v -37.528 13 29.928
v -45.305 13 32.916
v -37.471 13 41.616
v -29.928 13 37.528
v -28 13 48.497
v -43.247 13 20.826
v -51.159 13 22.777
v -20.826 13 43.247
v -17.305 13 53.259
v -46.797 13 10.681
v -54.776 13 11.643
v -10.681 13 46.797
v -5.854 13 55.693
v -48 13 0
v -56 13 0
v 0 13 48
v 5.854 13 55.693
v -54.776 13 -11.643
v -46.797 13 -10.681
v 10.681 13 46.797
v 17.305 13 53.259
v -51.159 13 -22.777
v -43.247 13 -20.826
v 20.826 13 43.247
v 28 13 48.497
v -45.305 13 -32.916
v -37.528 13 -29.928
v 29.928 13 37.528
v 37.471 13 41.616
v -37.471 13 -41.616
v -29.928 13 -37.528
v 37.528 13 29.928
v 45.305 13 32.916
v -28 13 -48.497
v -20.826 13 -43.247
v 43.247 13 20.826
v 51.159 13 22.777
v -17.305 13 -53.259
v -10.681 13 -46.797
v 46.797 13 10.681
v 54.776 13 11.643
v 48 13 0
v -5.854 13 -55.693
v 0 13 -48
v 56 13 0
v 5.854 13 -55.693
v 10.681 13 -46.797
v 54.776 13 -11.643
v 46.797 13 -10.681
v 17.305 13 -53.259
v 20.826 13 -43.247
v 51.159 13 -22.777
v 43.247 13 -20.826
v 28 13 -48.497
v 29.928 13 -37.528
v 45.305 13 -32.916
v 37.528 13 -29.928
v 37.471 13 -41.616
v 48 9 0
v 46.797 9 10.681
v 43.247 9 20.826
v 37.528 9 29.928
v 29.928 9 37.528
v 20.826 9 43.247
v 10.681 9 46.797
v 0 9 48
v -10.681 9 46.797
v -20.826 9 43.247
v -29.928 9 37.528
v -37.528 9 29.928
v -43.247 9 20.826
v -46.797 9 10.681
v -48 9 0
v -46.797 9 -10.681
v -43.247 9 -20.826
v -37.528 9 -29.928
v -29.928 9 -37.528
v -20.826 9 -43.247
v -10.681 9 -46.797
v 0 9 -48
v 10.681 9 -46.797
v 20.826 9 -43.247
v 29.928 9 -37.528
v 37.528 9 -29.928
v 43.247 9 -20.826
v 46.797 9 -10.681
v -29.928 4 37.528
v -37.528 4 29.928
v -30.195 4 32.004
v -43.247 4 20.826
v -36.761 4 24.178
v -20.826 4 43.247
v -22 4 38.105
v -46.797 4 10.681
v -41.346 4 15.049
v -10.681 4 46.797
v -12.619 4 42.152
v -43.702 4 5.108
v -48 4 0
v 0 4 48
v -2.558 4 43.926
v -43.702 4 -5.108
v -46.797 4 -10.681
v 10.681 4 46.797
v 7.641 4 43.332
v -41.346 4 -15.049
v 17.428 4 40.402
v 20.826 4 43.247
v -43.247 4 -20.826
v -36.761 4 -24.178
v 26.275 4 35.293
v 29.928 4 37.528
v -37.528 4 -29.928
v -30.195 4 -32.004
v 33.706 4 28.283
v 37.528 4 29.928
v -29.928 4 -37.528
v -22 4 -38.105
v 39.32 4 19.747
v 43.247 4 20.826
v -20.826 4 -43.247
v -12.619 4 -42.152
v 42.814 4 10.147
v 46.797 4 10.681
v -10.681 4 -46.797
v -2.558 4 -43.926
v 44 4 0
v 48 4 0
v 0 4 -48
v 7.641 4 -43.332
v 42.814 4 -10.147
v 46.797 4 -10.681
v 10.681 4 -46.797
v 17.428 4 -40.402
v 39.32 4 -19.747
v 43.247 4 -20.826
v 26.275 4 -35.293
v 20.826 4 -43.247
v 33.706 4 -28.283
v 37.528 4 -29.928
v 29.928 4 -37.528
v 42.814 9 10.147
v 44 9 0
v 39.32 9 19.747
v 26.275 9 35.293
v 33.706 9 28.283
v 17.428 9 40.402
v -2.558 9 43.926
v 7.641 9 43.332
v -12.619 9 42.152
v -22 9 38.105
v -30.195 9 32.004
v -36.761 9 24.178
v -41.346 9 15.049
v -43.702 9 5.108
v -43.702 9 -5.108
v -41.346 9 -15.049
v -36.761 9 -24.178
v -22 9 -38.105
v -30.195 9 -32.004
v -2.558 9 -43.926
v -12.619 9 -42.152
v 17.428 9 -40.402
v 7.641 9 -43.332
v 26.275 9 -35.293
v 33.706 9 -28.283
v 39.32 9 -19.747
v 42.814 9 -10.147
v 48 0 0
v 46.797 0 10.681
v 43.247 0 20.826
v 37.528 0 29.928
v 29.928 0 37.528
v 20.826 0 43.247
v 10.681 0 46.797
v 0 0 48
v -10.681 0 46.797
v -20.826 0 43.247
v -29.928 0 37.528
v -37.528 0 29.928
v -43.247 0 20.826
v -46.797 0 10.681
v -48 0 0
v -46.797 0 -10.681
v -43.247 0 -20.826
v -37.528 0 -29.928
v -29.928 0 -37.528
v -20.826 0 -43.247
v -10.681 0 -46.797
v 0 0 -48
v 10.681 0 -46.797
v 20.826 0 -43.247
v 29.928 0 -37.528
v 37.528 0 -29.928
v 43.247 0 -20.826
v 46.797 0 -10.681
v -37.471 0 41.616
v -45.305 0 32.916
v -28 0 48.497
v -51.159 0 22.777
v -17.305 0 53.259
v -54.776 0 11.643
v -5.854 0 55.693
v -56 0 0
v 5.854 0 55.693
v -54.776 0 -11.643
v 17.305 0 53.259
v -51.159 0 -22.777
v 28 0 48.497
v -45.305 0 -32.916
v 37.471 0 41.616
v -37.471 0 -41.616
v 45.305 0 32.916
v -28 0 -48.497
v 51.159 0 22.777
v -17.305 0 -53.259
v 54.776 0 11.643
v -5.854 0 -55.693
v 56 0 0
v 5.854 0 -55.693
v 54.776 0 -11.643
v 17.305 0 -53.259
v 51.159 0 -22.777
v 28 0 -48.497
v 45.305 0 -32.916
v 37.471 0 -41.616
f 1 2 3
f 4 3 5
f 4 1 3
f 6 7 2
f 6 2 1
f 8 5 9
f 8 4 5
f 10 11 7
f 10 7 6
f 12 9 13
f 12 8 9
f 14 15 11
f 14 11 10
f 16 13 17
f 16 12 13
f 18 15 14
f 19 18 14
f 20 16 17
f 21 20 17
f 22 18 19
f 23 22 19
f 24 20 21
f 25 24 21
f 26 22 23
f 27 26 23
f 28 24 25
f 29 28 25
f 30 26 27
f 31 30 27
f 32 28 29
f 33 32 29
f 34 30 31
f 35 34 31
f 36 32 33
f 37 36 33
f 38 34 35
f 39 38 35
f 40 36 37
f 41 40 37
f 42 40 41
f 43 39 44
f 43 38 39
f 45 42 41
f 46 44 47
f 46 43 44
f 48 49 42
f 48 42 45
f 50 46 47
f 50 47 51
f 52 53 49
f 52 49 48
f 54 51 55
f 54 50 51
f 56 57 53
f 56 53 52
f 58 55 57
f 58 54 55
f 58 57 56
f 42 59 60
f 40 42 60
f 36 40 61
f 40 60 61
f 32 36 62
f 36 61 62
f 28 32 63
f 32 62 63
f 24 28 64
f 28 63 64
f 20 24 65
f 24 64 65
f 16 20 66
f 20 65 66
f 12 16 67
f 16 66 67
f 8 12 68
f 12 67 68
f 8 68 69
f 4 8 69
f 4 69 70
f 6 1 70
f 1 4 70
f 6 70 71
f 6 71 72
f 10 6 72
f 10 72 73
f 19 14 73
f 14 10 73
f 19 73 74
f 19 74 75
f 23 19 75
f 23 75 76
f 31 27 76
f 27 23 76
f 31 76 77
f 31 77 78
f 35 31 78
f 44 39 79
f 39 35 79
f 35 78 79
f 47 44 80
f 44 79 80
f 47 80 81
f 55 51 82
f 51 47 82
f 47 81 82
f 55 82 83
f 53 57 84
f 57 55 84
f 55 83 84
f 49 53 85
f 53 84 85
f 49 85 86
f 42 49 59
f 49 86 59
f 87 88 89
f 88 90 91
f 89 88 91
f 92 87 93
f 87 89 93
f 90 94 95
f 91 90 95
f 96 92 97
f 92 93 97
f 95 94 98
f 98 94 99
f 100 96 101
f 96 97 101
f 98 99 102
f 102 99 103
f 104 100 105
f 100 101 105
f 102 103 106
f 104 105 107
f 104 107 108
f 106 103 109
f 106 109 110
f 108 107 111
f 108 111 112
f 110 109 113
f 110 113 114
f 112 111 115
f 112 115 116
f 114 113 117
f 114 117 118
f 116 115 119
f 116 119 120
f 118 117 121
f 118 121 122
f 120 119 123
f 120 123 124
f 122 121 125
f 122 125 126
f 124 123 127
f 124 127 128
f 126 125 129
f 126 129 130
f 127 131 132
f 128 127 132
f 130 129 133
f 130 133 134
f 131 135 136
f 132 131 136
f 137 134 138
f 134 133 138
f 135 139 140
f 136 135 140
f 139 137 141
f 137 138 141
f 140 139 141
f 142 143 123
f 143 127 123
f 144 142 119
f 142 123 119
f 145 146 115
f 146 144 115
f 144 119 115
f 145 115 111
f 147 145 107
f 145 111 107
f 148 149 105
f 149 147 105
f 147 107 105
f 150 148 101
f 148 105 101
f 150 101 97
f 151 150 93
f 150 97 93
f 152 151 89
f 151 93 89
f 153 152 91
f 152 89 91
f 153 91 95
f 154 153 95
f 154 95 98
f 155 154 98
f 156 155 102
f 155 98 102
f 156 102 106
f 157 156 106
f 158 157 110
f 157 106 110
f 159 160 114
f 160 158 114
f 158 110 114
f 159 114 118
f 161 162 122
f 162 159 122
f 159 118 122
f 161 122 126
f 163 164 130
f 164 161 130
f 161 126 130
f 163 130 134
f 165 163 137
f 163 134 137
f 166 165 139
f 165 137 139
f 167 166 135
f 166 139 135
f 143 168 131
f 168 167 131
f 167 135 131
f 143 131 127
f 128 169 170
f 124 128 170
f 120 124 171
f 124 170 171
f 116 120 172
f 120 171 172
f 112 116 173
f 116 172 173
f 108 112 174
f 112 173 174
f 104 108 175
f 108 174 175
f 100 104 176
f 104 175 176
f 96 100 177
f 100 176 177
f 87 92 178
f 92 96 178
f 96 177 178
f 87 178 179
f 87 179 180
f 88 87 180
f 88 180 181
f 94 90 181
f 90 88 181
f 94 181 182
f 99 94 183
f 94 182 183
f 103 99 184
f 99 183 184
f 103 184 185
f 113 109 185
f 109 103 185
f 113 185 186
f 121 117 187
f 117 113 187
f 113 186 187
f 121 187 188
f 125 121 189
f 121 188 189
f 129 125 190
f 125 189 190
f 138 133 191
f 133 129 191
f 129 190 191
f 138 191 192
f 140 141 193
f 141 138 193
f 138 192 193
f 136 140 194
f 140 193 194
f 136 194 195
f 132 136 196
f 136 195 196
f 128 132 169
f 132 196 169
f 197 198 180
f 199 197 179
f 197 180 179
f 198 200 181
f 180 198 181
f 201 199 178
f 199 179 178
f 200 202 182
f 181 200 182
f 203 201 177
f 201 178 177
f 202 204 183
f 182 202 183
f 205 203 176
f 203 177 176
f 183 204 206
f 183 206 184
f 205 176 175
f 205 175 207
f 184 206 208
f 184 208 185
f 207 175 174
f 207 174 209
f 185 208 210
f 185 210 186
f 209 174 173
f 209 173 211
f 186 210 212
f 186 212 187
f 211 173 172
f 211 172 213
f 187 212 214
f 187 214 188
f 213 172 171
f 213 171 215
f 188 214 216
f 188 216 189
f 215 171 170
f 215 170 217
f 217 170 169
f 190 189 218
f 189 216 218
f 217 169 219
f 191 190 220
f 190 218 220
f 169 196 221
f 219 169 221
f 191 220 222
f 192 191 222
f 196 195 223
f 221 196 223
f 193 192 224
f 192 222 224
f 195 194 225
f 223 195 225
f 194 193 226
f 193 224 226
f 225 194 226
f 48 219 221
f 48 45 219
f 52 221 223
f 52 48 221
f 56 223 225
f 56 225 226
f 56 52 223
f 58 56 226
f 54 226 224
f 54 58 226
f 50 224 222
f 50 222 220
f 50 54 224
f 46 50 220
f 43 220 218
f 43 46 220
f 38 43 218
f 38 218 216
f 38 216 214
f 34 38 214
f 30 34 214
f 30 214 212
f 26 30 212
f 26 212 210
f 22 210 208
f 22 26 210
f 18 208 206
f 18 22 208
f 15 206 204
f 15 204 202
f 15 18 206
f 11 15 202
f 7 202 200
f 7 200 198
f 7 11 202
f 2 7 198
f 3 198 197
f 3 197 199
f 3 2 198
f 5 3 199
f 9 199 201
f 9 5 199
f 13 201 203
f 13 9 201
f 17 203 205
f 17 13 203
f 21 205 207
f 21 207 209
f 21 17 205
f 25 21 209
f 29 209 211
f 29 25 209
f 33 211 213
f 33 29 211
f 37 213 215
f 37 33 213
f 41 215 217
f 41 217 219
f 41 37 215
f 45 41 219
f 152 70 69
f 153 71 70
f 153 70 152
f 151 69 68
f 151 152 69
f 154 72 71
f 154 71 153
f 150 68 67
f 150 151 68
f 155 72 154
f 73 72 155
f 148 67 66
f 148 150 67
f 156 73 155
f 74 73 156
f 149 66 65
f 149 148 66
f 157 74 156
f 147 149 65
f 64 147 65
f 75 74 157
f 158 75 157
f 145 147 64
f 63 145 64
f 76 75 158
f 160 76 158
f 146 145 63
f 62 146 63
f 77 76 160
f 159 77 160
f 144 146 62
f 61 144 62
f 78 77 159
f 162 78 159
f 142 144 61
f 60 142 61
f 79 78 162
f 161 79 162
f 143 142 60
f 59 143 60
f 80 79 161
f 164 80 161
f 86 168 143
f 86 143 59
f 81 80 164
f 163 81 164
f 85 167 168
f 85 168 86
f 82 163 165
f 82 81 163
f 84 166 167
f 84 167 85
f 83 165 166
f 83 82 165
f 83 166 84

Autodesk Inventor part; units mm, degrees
ref_plane "YZ Plane" through (0, 0, 0) normal (1, 0, 0) x (0, 1, 0)
ref_plane "XZ Plane" through (0, 0, 0) normal (0, 1, 0) x (-1, 0, 0)
ref_plane "XY Plane" through (0, 0, 0) normal (0, 0, 1) x (1, 0, 0)
sketch "Boceto1" plane through (0, 0, 0) normal (0, 0, 1) x (1, 0, 0)
  line L0 (0, 0) -> (56, 0) construction
  line L1 (56, 0) -> (56, 13)
  line L2 (56, 13) -> (48, 13)
  line L3 (48, 13) -> (48, 9)
  line L4 (48, 9) -> (44, 9)
  line L5 (44, 9) -> (44, 4)
  line L6 (44, 4) -> (48, 4)
  line L7 (48, 4) -> (48, 0)
  line L8 (48, 0) -> (56, 0)
  line L9 (0, 0) -> (0, 24.3321) construction
  dimension "d0" = 56
  dimension "d1" = 13
  dimension "d2" = 8
  dimension "d3" = 4
  dimension "d4" = 4
  dimension "d5" = 5
  dimension "d6" = 4
revolve "Revolución1" add sketch "Boceto1" angle 360 about axis through (0, 0, 0) along (0, 1, 0)
properties part number "20_AnilloPorSoldar2"
